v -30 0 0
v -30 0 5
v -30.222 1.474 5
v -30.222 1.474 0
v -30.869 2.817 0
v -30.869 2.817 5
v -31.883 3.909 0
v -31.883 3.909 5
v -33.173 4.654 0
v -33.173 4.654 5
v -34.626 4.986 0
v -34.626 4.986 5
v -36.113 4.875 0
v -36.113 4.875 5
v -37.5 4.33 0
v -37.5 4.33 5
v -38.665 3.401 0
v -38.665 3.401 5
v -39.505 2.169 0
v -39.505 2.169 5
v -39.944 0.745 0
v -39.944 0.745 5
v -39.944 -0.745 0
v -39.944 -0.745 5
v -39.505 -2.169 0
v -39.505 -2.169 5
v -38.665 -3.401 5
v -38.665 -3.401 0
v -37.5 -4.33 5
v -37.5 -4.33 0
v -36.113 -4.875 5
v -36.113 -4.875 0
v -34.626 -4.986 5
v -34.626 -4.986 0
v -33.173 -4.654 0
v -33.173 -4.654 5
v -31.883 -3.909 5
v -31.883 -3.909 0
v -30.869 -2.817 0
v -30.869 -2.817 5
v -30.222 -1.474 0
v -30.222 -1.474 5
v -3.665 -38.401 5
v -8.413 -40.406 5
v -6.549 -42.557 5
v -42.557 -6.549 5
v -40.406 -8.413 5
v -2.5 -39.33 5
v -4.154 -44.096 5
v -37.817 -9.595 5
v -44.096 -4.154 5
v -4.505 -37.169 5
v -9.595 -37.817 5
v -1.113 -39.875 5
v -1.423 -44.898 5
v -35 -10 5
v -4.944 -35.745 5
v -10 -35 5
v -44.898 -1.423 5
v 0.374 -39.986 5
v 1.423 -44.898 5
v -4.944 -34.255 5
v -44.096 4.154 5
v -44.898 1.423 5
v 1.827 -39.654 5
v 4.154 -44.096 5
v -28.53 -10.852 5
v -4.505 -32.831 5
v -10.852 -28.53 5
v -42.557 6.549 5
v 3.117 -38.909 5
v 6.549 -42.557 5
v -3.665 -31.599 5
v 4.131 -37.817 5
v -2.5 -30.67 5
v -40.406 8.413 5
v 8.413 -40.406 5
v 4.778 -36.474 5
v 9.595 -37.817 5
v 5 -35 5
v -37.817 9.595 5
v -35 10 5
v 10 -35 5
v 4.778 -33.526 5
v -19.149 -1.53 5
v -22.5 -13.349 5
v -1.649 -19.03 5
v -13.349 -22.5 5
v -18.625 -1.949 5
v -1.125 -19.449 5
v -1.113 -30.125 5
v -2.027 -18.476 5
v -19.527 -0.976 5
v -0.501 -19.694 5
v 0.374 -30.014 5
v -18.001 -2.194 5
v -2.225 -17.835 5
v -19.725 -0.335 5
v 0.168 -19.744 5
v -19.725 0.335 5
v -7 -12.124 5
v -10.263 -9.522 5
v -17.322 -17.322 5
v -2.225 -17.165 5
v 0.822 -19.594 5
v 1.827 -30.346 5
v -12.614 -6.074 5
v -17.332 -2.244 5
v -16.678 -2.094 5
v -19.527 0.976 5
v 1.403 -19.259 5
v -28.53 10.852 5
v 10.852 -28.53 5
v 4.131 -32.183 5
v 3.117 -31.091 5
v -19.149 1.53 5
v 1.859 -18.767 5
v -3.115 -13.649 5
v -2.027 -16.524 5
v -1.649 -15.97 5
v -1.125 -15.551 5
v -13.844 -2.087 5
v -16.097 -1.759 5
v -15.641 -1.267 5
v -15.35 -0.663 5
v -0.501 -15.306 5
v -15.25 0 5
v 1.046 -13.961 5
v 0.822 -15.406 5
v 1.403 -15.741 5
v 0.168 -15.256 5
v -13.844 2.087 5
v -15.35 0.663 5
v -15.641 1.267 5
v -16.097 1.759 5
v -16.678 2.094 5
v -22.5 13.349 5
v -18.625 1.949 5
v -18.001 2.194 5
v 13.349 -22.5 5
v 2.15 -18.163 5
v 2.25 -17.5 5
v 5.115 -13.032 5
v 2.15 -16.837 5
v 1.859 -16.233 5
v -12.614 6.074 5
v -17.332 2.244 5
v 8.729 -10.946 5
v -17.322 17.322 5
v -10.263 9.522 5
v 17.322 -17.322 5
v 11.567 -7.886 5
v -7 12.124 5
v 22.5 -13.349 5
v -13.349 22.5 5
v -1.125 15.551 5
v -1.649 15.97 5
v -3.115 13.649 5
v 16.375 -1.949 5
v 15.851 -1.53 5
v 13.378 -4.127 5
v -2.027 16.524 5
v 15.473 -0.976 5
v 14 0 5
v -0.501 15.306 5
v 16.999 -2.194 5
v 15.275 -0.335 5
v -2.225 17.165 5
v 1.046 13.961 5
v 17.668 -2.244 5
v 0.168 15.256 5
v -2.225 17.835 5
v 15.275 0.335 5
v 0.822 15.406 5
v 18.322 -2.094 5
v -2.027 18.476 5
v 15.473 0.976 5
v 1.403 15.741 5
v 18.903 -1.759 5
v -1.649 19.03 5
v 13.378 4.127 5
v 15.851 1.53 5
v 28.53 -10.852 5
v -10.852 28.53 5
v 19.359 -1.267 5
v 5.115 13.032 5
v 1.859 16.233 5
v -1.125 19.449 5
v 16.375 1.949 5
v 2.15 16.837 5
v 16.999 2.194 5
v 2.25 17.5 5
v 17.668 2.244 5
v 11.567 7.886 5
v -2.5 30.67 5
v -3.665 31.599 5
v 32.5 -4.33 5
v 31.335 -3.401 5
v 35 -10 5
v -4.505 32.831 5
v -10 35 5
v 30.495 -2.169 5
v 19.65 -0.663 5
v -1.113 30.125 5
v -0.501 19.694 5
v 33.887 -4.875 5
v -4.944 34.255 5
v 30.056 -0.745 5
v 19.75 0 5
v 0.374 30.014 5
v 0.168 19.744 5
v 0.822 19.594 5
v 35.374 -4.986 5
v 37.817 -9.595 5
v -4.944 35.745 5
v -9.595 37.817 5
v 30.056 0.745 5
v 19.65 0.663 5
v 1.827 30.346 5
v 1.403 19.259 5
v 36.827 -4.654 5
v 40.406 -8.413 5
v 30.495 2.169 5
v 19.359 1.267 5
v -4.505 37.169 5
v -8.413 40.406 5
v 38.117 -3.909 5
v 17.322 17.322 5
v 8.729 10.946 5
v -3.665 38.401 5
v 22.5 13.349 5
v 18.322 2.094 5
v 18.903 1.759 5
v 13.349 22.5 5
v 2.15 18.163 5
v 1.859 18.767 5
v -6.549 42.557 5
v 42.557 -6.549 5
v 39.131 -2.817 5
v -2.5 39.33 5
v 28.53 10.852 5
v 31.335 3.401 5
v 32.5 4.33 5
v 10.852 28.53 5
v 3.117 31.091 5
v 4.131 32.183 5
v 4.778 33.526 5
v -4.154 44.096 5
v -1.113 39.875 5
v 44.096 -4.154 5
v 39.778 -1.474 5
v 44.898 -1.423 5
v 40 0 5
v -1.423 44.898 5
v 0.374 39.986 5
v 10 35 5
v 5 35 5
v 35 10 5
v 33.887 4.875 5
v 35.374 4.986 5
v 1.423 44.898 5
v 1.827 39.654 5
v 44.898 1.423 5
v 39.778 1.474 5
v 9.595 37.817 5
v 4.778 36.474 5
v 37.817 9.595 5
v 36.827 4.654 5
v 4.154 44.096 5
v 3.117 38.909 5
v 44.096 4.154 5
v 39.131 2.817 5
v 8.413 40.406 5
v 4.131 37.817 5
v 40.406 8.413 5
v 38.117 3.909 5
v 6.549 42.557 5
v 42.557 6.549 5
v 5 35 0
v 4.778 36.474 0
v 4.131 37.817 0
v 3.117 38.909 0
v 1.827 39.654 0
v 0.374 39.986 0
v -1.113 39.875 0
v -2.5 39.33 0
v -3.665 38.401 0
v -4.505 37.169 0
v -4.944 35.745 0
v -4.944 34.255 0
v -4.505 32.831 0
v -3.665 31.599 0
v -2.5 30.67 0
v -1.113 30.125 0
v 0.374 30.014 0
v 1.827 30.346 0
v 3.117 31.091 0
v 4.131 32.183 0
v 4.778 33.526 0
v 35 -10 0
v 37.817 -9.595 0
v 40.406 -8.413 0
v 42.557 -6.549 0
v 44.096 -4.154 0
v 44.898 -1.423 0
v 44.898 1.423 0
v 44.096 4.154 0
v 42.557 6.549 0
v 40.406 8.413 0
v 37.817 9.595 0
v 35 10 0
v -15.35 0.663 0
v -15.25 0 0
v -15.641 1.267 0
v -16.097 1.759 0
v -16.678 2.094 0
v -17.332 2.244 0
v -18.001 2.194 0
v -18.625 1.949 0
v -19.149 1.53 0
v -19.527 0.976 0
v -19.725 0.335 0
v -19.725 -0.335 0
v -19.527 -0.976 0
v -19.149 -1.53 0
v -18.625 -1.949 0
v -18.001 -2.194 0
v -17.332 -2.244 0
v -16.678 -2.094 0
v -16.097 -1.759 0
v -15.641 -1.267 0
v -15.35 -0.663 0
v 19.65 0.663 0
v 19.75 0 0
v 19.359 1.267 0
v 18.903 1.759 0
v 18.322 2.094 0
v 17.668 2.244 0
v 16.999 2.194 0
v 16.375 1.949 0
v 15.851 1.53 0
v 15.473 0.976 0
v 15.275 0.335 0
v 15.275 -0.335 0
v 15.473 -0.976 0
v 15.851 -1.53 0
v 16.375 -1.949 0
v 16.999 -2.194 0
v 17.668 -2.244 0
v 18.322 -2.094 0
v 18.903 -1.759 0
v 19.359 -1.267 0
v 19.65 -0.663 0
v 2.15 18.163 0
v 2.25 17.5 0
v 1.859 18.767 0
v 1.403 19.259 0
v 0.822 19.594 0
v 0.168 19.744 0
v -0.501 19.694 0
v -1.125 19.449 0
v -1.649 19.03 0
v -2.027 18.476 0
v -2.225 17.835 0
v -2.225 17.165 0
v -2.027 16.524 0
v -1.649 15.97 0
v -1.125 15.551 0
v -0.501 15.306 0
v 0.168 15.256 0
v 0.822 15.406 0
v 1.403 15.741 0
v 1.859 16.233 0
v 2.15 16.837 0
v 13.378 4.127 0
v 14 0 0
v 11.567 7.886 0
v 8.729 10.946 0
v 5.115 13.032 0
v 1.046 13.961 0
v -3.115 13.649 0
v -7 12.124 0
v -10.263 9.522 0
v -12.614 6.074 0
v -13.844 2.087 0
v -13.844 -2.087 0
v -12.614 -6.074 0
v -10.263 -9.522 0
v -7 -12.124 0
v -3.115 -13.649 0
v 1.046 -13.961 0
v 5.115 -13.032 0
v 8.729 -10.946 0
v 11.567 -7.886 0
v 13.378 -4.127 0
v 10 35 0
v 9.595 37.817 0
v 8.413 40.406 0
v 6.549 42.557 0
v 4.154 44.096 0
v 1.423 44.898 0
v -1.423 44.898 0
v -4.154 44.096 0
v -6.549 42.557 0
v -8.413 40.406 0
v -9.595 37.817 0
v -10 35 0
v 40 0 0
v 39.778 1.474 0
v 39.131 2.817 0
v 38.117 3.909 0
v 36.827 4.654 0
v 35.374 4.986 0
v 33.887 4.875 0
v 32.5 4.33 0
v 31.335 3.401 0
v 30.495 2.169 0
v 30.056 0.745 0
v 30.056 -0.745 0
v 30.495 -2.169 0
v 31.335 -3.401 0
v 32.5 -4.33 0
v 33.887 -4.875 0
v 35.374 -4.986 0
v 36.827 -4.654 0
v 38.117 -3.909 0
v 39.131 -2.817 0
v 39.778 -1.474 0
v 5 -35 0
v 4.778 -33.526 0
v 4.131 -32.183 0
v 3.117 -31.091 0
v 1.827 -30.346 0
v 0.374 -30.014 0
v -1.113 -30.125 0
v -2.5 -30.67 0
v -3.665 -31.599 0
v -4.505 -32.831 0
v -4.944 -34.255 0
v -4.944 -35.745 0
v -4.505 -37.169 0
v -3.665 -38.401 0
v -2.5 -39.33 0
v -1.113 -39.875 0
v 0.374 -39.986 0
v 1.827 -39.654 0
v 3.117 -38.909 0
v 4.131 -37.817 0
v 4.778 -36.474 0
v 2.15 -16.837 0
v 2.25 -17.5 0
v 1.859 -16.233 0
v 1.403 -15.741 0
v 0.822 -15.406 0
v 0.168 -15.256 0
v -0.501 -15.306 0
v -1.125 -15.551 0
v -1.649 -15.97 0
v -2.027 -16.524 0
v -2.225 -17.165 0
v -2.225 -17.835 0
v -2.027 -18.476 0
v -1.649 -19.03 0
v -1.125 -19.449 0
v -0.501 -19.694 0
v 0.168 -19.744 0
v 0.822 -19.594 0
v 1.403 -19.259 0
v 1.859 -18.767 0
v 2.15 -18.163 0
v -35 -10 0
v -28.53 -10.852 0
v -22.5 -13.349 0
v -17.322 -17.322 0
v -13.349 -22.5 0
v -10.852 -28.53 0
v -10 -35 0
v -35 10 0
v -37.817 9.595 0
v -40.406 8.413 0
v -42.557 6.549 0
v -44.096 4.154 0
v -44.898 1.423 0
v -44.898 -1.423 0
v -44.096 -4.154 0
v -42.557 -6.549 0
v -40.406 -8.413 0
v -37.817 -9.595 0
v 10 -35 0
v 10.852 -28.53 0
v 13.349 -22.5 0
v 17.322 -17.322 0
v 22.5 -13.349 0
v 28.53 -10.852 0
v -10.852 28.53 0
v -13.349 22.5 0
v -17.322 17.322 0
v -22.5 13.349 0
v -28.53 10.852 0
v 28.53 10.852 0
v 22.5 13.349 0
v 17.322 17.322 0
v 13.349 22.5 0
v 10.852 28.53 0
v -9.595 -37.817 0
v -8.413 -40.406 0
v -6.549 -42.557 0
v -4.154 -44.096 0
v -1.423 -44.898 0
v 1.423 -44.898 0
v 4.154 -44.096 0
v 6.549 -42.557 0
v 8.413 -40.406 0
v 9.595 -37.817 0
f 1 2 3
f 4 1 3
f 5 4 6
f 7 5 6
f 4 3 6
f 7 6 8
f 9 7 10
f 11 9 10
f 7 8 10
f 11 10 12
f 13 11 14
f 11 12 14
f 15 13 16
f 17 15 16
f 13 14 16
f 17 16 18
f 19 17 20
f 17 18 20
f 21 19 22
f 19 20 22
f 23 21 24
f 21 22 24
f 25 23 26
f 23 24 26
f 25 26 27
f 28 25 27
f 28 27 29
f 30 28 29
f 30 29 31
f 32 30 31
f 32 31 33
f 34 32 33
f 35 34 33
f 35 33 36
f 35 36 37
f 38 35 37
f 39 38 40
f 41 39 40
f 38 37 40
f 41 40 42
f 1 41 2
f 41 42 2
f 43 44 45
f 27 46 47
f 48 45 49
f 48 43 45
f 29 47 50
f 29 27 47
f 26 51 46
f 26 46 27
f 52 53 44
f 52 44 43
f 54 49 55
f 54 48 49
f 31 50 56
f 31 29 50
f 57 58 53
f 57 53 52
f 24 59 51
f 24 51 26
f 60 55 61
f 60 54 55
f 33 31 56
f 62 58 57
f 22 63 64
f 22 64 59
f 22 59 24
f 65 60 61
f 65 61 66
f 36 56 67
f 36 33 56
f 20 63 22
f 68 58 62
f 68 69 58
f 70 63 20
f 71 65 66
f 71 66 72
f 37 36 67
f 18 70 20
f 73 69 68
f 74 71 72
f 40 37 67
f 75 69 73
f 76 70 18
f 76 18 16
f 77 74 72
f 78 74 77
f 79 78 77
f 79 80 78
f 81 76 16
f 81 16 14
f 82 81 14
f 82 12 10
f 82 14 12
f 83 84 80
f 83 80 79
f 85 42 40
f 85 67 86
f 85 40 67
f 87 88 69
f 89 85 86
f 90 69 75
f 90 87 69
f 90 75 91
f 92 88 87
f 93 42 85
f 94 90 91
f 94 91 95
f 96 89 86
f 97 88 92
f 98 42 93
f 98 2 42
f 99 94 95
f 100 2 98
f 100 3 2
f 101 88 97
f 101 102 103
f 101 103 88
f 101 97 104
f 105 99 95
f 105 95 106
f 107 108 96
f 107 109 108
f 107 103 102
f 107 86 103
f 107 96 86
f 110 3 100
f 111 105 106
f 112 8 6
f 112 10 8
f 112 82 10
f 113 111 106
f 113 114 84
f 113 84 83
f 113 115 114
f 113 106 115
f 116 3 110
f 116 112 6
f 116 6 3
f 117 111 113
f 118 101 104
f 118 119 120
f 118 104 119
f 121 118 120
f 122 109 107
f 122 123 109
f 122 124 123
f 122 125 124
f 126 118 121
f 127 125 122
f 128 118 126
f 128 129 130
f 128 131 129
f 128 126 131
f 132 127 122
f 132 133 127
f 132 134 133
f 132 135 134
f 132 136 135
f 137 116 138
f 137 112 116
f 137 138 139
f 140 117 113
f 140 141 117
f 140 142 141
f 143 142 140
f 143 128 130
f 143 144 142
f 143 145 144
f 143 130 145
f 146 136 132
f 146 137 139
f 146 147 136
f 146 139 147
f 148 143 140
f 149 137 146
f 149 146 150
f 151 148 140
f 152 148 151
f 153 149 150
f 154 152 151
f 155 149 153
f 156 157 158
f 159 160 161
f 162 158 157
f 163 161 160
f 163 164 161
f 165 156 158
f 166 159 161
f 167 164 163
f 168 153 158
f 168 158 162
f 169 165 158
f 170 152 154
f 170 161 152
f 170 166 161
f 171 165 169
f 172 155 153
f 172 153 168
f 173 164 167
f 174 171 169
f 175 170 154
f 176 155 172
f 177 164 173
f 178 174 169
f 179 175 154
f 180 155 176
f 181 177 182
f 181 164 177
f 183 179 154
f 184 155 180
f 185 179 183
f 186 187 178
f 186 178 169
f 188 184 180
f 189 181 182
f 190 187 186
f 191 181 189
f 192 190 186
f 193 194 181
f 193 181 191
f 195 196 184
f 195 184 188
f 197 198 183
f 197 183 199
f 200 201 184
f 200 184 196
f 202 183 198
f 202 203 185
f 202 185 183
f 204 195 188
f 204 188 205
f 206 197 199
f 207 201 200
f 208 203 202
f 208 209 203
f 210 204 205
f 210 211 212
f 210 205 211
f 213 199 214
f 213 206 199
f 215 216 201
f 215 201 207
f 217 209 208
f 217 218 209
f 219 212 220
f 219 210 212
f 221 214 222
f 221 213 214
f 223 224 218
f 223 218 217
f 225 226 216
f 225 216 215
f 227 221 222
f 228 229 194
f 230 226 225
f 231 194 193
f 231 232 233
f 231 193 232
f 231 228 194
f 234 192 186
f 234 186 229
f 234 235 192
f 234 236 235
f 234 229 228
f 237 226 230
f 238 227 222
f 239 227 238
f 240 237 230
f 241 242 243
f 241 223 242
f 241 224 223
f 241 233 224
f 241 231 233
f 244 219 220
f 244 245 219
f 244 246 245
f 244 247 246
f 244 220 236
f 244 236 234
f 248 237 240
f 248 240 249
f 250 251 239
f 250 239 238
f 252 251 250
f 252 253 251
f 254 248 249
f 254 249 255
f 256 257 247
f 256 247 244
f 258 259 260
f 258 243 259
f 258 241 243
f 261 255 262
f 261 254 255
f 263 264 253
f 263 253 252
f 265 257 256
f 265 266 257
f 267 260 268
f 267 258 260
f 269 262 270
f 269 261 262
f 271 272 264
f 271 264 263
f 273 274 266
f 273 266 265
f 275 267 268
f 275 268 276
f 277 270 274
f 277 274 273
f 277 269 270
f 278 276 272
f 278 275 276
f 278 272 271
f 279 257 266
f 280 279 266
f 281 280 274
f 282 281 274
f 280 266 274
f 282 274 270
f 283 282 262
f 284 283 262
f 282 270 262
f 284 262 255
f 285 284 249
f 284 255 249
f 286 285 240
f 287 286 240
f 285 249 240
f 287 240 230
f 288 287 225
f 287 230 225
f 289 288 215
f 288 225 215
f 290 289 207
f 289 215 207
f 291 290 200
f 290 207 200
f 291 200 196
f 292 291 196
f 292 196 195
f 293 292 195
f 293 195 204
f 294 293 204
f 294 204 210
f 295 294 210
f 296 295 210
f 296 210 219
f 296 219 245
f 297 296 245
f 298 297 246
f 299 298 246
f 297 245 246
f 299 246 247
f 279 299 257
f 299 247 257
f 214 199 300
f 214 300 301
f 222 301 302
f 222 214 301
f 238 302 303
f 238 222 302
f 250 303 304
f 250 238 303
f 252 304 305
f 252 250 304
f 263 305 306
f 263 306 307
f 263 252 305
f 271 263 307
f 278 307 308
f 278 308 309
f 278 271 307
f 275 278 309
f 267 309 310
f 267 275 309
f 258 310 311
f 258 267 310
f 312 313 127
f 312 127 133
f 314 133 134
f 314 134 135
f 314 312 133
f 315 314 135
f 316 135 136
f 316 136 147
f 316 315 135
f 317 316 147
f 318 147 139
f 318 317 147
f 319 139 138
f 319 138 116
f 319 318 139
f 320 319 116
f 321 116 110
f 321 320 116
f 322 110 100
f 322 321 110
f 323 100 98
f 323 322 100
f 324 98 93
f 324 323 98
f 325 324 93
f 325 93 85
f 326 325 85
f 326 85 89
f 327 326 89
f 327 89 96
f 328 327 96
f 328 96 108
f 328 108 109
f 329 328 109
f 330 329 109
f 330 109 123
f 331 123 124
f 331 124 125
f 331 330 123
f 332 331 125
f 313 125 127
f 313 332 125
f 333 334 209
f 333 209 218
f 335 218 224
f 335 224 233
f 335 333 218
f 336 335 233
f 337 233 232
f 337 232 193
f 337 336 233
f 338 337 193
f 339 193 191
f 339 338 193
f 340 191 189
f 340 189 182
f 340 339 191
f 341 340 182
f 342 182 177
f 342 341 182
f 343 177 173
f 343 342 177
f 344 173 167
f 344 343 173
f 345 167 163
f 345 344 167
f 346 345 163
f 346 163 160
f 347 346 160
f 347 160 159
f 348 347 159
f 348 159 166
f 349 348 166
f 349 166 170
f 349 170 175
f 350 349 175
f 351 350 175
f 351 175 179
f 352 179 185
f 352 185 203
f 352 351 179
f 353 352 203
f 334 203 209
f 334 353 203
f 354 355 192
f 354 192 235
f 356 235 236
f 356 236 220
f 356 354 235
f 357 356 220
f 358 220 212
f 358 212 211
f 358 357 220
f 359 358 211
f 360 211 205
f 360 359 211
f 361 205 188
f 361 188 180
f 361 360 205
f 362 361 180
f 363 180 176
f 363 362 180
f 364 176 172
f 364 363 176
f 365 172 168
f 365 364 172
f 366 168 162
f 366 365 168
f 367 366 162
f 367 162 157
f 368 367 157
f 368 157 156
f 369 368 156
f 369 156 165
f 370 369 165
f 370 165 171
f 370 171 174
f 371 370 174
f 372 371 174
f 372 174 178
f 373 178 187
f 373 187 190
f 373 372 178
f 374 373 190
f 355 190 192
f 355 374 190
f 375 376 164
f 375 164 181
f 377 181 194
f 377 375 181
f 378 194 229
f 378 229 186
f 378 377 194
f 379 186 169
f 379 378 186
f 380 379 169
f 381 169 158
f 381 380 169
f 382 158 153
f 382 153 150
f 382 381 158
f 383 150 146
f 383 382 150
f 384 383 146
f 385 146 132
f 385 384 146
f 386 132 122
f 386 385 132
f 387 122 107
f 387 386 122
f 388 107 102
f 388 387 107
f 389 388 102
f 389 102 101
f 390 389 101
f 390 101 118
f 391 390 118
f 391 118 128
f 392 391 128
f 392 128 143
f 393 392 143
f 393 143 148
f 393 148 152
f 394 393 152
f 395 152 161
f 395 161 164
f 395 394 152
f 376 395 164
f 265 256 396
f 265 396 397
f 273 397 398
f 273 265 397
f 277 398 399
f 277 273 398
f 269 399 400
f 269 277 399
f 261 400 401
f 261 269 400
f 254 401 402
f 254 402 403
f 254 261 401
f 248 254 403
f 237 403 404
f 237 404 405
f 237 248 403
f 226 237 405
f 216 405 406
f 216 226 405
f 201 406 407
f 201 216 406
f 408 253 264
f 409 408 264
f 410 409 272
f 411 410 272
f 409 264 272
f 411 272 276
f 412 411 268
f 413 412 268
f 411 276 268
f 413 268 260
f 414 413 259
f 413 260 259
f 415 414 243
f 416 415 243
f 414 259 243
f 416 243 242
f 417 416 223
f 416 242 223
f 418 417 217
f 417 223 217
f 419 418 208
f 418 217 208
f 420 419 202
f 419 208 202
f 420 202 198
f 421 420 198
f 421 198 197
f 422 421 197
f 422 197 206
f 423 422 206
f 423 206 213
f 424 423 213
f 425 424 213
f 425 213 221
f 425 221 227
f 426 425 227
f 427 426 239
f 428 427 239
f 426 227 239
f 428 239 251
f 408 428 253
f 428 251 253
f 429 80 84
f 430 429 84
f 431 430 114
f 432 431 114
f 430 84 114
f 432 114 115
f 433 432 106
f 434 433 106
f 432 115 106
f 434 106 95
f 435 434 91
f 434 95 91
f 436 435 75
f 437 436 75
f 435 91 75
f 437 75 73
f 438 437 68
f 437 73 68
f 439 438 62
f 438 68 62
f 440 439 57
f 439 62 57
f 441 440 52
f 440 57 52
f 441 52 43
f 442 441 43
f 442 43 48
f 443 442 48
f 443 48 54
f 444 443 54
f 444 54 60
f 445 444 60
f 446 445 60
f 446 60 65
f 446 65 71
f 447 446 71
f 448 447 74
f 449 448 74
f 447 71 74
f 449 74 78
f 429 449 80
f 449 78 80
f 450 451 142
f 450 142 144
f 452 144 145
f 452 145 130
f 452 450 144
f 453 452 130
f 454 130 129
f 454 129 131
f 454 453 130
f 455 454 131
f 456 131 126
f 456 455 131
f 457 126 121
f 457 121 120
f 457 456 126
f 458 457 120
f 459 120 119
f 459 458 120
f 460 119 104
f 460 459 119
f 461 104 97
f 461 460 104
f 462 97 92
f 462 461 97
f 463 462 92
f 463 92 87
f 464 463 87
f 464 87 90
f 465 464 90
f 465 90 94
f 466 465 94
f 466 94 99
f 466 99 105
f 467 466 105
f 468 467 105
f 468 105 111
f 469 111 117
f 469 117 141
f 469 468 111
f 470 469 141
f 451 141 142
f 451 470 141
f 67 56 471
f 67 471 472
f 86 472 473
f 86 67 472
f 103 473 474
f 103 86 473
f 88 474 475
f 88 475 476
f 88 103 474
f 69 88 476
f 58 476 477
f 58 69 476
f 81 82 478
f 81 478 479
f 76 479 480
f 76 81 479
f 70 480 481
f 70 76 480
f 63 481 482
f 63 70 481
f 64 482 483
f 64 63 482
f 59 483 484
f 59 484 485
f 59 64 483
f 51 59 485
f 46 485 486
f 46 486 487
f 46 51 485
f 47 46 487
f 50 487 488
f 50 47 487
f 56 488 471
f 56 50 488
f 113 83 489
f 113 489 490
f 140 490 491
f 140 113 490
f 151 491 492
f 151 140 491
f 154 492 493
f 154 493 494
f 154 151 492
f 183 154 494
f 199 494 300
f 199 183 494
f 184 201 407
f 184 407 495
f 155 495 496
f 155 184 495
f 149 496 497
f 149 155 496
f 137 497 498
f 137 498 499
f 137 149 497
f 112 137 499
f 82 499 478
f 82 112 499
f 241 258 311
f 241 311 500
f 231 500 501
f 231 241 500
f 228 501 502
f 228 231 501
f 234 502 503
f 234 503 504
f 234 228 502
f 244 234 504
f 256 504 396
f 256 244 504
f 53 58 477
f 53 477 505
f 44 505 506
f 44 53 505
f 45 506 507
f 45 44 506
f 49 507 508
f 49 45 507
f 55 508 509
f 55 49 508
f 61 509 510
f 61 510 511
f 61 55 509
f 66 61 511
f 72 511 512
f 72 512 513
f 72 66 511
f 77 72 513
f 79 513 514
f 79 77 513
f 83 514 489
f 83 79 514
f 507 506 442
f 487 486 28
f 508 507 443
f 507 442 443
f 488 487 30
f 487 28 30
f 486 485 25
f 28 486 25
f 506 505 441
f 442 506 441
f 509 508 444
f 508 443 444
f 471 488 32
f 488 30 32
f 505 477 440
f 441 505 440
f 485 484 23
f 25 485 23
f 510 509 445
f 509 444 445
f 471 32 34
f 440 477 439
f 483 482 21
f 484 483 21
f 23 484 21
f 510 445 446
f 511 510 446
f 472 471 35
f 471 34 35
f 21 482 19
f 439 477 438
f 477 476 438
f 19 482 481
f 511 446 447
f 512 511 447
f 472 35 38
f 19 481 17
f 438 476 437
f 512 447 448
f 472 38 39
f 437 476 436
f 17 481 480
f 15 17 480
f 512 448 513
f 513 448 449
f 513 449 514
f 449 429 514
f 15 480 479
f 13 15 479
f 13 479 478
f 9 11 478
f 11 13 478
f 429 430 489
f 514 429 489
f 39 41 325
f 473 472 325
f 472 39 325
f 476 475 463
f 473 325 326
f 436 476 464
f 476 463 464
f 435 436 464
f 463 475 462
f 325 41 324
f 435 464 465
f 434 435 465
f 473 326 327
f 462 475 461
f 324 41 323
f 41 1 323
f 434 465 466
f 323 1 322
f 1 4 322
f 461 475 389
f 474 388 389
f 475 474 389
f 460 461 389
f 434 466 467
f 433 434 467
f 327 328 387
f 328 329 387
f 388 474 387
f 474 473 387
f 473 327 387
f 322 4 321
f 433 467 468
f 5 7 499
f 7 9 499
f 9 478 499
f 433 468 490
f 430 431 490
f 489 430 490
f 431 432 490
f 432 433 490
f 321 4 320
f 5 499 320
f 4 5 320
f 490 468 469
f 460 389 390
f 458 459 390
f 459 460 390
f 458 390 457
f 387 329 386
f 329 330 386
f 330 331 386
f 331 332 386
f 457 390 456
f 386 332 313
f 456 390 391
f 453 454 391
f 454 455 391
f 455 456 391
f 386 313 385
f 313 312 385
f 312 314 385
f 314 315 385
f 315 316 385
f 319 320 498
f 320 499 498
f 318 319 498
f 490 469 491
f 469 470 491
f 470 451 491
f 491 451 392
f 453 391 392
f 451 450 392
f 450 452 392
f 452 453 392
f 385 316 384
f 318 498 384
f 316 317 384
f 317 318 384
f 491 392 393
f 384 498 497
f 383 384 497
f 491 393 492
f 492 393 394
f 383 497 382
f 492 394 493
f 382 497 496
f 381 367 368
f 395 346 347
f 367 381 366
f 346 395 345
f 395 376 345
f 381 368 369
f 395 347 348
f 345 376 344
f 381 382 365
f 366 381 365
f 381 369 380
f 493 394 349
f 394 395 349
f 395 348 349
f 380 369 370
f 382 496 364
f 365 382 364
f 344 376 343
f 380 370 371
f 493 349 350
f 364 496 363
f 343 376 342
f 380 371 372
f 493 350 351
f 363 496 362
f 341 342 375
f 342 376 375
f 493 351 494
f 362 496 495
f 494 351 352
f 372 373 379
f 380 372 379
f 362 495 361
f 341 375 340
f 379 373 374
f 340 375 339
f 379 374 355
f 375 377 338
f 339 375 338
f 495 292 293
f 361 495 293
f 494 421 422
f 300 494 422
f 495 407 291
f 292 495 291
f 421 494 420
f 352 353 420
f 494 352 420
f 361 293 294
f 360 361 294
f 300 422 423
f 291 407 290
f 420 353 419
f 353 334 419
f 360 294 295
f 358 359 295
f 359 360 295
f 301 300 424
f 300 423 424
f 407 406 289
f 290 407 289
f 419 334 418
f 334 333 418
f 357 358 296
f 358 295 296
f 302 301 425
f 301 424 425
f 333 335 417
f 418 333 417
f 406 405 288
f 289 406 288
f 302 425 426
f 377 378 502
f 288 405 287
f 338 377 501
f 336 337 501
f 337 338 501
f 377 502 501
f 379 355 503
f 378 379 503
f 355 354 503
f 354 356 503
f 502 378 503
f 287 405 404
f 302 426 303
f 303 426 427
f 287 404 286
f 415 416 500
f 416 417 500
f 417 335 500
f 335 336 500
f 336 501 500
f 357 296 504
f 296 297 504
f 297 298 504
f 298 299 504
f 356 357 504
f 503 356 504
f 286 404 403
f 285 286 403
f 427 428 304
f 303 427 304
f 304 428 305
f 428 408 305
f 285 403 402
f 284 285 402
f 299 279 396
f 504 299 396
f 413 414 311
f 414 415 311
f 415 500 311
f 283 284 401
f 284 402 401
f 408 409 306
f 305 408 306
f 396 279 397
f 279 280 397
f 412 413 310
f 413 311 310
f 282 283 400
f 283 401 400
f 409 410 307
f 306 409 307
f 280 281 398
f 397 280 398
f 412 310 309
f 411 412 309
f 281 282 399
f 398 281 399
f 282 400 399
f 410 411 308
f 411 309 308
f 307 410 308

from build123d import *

# Parameters (mm, degrees)
SZKIC1_R                    = 24
SZKIC1_R_2                  = 2.25
SZKIC1_R_3                  = 14
DODANIE_WYCI_GNI_CIE1_DEPTH = 5
SZKIC2_R                    = 5
SZKIC2_R_2                  = 22.5
DODANIE_WYCI_GNI_CIE2_DEPTH = 5


with BuildPart() as part:
    # Szkic1 → Dodanie-wyciągnięcie1 (new body)
    with BuildSketch(Plane.XY):
        Circle(SZKIC1_R)
        with Locations((0, 17.5)):
            Circle(SZKIC1_R_2, mode=Mode.SUBTRACT)
        with Locations((17.5, 0)):
            Circle(SZKIC1_R_2, mode=Mode.SUBTRACT)
        with Locations((0, -17.5)):
            Circle(SZKIC1_R_2, mode=Mode.SUBTRACT)
        with Locations((-17.5, 0)):
            Circle(SZKIC1_R_2, mode=Mode.SUBTRACT)
        Circle(SZKIC1_R_3, mode=Mode.SUBTRACT)
    extrude(amount=DODANIE_WYCI_GNI_CIE1_DEPTH)

    # Szkic2 → Dodanie-wyciągnięcie2 (add)
    with BuildSketch(Plane.XY.offset(5)):
        with BuildLine():
            ThreePointArc((10, 35), (0, 45), (-10, 35))
            ThreePointArc((-10, 35), (-17.32233047, 17.32233047), (-35, 10))
            ThreePointArc((-35, 10), (-45, 0), (-35, -10))
            ThreePointArc((-35, -10), (-17.32233047, -17.32233047), (-10, -35))
            ThreePointArc((-10, -35), (0, -45), (10, -35))
            ThreePointArc((10, -35), (17.32233047, -17.32233047), (35, -10))
            ThreePointArc((35, -10), (45, 0), (35, 10))
            ThreePointArc((35, 10), (17.32233047, 17.32233047), (10, 35))
        make_face()
        with Locations((0, -35)):
            Circle(SZKIC2_R, mode=Mode.SUBTRACT)
        with Locations((-35, 0)):
            Circle(SZKIC2_R, mode=Mode.SUBTRACT)
        Circle(SZKIC2_R_2, mode=Mode.SUBTRACT)
        with Locations((35, 0)):
            Circle(SZKIC2_R, mode=Mode.SUBTRACT)
        with Locations((0, 35)):
            Circle(SZKIC2_R, mode=Mode.SUBTRACT)
    extrude(amount=-DODANIE_WYCI_GNI_CIE2_DEPTH)


solid = part.part
